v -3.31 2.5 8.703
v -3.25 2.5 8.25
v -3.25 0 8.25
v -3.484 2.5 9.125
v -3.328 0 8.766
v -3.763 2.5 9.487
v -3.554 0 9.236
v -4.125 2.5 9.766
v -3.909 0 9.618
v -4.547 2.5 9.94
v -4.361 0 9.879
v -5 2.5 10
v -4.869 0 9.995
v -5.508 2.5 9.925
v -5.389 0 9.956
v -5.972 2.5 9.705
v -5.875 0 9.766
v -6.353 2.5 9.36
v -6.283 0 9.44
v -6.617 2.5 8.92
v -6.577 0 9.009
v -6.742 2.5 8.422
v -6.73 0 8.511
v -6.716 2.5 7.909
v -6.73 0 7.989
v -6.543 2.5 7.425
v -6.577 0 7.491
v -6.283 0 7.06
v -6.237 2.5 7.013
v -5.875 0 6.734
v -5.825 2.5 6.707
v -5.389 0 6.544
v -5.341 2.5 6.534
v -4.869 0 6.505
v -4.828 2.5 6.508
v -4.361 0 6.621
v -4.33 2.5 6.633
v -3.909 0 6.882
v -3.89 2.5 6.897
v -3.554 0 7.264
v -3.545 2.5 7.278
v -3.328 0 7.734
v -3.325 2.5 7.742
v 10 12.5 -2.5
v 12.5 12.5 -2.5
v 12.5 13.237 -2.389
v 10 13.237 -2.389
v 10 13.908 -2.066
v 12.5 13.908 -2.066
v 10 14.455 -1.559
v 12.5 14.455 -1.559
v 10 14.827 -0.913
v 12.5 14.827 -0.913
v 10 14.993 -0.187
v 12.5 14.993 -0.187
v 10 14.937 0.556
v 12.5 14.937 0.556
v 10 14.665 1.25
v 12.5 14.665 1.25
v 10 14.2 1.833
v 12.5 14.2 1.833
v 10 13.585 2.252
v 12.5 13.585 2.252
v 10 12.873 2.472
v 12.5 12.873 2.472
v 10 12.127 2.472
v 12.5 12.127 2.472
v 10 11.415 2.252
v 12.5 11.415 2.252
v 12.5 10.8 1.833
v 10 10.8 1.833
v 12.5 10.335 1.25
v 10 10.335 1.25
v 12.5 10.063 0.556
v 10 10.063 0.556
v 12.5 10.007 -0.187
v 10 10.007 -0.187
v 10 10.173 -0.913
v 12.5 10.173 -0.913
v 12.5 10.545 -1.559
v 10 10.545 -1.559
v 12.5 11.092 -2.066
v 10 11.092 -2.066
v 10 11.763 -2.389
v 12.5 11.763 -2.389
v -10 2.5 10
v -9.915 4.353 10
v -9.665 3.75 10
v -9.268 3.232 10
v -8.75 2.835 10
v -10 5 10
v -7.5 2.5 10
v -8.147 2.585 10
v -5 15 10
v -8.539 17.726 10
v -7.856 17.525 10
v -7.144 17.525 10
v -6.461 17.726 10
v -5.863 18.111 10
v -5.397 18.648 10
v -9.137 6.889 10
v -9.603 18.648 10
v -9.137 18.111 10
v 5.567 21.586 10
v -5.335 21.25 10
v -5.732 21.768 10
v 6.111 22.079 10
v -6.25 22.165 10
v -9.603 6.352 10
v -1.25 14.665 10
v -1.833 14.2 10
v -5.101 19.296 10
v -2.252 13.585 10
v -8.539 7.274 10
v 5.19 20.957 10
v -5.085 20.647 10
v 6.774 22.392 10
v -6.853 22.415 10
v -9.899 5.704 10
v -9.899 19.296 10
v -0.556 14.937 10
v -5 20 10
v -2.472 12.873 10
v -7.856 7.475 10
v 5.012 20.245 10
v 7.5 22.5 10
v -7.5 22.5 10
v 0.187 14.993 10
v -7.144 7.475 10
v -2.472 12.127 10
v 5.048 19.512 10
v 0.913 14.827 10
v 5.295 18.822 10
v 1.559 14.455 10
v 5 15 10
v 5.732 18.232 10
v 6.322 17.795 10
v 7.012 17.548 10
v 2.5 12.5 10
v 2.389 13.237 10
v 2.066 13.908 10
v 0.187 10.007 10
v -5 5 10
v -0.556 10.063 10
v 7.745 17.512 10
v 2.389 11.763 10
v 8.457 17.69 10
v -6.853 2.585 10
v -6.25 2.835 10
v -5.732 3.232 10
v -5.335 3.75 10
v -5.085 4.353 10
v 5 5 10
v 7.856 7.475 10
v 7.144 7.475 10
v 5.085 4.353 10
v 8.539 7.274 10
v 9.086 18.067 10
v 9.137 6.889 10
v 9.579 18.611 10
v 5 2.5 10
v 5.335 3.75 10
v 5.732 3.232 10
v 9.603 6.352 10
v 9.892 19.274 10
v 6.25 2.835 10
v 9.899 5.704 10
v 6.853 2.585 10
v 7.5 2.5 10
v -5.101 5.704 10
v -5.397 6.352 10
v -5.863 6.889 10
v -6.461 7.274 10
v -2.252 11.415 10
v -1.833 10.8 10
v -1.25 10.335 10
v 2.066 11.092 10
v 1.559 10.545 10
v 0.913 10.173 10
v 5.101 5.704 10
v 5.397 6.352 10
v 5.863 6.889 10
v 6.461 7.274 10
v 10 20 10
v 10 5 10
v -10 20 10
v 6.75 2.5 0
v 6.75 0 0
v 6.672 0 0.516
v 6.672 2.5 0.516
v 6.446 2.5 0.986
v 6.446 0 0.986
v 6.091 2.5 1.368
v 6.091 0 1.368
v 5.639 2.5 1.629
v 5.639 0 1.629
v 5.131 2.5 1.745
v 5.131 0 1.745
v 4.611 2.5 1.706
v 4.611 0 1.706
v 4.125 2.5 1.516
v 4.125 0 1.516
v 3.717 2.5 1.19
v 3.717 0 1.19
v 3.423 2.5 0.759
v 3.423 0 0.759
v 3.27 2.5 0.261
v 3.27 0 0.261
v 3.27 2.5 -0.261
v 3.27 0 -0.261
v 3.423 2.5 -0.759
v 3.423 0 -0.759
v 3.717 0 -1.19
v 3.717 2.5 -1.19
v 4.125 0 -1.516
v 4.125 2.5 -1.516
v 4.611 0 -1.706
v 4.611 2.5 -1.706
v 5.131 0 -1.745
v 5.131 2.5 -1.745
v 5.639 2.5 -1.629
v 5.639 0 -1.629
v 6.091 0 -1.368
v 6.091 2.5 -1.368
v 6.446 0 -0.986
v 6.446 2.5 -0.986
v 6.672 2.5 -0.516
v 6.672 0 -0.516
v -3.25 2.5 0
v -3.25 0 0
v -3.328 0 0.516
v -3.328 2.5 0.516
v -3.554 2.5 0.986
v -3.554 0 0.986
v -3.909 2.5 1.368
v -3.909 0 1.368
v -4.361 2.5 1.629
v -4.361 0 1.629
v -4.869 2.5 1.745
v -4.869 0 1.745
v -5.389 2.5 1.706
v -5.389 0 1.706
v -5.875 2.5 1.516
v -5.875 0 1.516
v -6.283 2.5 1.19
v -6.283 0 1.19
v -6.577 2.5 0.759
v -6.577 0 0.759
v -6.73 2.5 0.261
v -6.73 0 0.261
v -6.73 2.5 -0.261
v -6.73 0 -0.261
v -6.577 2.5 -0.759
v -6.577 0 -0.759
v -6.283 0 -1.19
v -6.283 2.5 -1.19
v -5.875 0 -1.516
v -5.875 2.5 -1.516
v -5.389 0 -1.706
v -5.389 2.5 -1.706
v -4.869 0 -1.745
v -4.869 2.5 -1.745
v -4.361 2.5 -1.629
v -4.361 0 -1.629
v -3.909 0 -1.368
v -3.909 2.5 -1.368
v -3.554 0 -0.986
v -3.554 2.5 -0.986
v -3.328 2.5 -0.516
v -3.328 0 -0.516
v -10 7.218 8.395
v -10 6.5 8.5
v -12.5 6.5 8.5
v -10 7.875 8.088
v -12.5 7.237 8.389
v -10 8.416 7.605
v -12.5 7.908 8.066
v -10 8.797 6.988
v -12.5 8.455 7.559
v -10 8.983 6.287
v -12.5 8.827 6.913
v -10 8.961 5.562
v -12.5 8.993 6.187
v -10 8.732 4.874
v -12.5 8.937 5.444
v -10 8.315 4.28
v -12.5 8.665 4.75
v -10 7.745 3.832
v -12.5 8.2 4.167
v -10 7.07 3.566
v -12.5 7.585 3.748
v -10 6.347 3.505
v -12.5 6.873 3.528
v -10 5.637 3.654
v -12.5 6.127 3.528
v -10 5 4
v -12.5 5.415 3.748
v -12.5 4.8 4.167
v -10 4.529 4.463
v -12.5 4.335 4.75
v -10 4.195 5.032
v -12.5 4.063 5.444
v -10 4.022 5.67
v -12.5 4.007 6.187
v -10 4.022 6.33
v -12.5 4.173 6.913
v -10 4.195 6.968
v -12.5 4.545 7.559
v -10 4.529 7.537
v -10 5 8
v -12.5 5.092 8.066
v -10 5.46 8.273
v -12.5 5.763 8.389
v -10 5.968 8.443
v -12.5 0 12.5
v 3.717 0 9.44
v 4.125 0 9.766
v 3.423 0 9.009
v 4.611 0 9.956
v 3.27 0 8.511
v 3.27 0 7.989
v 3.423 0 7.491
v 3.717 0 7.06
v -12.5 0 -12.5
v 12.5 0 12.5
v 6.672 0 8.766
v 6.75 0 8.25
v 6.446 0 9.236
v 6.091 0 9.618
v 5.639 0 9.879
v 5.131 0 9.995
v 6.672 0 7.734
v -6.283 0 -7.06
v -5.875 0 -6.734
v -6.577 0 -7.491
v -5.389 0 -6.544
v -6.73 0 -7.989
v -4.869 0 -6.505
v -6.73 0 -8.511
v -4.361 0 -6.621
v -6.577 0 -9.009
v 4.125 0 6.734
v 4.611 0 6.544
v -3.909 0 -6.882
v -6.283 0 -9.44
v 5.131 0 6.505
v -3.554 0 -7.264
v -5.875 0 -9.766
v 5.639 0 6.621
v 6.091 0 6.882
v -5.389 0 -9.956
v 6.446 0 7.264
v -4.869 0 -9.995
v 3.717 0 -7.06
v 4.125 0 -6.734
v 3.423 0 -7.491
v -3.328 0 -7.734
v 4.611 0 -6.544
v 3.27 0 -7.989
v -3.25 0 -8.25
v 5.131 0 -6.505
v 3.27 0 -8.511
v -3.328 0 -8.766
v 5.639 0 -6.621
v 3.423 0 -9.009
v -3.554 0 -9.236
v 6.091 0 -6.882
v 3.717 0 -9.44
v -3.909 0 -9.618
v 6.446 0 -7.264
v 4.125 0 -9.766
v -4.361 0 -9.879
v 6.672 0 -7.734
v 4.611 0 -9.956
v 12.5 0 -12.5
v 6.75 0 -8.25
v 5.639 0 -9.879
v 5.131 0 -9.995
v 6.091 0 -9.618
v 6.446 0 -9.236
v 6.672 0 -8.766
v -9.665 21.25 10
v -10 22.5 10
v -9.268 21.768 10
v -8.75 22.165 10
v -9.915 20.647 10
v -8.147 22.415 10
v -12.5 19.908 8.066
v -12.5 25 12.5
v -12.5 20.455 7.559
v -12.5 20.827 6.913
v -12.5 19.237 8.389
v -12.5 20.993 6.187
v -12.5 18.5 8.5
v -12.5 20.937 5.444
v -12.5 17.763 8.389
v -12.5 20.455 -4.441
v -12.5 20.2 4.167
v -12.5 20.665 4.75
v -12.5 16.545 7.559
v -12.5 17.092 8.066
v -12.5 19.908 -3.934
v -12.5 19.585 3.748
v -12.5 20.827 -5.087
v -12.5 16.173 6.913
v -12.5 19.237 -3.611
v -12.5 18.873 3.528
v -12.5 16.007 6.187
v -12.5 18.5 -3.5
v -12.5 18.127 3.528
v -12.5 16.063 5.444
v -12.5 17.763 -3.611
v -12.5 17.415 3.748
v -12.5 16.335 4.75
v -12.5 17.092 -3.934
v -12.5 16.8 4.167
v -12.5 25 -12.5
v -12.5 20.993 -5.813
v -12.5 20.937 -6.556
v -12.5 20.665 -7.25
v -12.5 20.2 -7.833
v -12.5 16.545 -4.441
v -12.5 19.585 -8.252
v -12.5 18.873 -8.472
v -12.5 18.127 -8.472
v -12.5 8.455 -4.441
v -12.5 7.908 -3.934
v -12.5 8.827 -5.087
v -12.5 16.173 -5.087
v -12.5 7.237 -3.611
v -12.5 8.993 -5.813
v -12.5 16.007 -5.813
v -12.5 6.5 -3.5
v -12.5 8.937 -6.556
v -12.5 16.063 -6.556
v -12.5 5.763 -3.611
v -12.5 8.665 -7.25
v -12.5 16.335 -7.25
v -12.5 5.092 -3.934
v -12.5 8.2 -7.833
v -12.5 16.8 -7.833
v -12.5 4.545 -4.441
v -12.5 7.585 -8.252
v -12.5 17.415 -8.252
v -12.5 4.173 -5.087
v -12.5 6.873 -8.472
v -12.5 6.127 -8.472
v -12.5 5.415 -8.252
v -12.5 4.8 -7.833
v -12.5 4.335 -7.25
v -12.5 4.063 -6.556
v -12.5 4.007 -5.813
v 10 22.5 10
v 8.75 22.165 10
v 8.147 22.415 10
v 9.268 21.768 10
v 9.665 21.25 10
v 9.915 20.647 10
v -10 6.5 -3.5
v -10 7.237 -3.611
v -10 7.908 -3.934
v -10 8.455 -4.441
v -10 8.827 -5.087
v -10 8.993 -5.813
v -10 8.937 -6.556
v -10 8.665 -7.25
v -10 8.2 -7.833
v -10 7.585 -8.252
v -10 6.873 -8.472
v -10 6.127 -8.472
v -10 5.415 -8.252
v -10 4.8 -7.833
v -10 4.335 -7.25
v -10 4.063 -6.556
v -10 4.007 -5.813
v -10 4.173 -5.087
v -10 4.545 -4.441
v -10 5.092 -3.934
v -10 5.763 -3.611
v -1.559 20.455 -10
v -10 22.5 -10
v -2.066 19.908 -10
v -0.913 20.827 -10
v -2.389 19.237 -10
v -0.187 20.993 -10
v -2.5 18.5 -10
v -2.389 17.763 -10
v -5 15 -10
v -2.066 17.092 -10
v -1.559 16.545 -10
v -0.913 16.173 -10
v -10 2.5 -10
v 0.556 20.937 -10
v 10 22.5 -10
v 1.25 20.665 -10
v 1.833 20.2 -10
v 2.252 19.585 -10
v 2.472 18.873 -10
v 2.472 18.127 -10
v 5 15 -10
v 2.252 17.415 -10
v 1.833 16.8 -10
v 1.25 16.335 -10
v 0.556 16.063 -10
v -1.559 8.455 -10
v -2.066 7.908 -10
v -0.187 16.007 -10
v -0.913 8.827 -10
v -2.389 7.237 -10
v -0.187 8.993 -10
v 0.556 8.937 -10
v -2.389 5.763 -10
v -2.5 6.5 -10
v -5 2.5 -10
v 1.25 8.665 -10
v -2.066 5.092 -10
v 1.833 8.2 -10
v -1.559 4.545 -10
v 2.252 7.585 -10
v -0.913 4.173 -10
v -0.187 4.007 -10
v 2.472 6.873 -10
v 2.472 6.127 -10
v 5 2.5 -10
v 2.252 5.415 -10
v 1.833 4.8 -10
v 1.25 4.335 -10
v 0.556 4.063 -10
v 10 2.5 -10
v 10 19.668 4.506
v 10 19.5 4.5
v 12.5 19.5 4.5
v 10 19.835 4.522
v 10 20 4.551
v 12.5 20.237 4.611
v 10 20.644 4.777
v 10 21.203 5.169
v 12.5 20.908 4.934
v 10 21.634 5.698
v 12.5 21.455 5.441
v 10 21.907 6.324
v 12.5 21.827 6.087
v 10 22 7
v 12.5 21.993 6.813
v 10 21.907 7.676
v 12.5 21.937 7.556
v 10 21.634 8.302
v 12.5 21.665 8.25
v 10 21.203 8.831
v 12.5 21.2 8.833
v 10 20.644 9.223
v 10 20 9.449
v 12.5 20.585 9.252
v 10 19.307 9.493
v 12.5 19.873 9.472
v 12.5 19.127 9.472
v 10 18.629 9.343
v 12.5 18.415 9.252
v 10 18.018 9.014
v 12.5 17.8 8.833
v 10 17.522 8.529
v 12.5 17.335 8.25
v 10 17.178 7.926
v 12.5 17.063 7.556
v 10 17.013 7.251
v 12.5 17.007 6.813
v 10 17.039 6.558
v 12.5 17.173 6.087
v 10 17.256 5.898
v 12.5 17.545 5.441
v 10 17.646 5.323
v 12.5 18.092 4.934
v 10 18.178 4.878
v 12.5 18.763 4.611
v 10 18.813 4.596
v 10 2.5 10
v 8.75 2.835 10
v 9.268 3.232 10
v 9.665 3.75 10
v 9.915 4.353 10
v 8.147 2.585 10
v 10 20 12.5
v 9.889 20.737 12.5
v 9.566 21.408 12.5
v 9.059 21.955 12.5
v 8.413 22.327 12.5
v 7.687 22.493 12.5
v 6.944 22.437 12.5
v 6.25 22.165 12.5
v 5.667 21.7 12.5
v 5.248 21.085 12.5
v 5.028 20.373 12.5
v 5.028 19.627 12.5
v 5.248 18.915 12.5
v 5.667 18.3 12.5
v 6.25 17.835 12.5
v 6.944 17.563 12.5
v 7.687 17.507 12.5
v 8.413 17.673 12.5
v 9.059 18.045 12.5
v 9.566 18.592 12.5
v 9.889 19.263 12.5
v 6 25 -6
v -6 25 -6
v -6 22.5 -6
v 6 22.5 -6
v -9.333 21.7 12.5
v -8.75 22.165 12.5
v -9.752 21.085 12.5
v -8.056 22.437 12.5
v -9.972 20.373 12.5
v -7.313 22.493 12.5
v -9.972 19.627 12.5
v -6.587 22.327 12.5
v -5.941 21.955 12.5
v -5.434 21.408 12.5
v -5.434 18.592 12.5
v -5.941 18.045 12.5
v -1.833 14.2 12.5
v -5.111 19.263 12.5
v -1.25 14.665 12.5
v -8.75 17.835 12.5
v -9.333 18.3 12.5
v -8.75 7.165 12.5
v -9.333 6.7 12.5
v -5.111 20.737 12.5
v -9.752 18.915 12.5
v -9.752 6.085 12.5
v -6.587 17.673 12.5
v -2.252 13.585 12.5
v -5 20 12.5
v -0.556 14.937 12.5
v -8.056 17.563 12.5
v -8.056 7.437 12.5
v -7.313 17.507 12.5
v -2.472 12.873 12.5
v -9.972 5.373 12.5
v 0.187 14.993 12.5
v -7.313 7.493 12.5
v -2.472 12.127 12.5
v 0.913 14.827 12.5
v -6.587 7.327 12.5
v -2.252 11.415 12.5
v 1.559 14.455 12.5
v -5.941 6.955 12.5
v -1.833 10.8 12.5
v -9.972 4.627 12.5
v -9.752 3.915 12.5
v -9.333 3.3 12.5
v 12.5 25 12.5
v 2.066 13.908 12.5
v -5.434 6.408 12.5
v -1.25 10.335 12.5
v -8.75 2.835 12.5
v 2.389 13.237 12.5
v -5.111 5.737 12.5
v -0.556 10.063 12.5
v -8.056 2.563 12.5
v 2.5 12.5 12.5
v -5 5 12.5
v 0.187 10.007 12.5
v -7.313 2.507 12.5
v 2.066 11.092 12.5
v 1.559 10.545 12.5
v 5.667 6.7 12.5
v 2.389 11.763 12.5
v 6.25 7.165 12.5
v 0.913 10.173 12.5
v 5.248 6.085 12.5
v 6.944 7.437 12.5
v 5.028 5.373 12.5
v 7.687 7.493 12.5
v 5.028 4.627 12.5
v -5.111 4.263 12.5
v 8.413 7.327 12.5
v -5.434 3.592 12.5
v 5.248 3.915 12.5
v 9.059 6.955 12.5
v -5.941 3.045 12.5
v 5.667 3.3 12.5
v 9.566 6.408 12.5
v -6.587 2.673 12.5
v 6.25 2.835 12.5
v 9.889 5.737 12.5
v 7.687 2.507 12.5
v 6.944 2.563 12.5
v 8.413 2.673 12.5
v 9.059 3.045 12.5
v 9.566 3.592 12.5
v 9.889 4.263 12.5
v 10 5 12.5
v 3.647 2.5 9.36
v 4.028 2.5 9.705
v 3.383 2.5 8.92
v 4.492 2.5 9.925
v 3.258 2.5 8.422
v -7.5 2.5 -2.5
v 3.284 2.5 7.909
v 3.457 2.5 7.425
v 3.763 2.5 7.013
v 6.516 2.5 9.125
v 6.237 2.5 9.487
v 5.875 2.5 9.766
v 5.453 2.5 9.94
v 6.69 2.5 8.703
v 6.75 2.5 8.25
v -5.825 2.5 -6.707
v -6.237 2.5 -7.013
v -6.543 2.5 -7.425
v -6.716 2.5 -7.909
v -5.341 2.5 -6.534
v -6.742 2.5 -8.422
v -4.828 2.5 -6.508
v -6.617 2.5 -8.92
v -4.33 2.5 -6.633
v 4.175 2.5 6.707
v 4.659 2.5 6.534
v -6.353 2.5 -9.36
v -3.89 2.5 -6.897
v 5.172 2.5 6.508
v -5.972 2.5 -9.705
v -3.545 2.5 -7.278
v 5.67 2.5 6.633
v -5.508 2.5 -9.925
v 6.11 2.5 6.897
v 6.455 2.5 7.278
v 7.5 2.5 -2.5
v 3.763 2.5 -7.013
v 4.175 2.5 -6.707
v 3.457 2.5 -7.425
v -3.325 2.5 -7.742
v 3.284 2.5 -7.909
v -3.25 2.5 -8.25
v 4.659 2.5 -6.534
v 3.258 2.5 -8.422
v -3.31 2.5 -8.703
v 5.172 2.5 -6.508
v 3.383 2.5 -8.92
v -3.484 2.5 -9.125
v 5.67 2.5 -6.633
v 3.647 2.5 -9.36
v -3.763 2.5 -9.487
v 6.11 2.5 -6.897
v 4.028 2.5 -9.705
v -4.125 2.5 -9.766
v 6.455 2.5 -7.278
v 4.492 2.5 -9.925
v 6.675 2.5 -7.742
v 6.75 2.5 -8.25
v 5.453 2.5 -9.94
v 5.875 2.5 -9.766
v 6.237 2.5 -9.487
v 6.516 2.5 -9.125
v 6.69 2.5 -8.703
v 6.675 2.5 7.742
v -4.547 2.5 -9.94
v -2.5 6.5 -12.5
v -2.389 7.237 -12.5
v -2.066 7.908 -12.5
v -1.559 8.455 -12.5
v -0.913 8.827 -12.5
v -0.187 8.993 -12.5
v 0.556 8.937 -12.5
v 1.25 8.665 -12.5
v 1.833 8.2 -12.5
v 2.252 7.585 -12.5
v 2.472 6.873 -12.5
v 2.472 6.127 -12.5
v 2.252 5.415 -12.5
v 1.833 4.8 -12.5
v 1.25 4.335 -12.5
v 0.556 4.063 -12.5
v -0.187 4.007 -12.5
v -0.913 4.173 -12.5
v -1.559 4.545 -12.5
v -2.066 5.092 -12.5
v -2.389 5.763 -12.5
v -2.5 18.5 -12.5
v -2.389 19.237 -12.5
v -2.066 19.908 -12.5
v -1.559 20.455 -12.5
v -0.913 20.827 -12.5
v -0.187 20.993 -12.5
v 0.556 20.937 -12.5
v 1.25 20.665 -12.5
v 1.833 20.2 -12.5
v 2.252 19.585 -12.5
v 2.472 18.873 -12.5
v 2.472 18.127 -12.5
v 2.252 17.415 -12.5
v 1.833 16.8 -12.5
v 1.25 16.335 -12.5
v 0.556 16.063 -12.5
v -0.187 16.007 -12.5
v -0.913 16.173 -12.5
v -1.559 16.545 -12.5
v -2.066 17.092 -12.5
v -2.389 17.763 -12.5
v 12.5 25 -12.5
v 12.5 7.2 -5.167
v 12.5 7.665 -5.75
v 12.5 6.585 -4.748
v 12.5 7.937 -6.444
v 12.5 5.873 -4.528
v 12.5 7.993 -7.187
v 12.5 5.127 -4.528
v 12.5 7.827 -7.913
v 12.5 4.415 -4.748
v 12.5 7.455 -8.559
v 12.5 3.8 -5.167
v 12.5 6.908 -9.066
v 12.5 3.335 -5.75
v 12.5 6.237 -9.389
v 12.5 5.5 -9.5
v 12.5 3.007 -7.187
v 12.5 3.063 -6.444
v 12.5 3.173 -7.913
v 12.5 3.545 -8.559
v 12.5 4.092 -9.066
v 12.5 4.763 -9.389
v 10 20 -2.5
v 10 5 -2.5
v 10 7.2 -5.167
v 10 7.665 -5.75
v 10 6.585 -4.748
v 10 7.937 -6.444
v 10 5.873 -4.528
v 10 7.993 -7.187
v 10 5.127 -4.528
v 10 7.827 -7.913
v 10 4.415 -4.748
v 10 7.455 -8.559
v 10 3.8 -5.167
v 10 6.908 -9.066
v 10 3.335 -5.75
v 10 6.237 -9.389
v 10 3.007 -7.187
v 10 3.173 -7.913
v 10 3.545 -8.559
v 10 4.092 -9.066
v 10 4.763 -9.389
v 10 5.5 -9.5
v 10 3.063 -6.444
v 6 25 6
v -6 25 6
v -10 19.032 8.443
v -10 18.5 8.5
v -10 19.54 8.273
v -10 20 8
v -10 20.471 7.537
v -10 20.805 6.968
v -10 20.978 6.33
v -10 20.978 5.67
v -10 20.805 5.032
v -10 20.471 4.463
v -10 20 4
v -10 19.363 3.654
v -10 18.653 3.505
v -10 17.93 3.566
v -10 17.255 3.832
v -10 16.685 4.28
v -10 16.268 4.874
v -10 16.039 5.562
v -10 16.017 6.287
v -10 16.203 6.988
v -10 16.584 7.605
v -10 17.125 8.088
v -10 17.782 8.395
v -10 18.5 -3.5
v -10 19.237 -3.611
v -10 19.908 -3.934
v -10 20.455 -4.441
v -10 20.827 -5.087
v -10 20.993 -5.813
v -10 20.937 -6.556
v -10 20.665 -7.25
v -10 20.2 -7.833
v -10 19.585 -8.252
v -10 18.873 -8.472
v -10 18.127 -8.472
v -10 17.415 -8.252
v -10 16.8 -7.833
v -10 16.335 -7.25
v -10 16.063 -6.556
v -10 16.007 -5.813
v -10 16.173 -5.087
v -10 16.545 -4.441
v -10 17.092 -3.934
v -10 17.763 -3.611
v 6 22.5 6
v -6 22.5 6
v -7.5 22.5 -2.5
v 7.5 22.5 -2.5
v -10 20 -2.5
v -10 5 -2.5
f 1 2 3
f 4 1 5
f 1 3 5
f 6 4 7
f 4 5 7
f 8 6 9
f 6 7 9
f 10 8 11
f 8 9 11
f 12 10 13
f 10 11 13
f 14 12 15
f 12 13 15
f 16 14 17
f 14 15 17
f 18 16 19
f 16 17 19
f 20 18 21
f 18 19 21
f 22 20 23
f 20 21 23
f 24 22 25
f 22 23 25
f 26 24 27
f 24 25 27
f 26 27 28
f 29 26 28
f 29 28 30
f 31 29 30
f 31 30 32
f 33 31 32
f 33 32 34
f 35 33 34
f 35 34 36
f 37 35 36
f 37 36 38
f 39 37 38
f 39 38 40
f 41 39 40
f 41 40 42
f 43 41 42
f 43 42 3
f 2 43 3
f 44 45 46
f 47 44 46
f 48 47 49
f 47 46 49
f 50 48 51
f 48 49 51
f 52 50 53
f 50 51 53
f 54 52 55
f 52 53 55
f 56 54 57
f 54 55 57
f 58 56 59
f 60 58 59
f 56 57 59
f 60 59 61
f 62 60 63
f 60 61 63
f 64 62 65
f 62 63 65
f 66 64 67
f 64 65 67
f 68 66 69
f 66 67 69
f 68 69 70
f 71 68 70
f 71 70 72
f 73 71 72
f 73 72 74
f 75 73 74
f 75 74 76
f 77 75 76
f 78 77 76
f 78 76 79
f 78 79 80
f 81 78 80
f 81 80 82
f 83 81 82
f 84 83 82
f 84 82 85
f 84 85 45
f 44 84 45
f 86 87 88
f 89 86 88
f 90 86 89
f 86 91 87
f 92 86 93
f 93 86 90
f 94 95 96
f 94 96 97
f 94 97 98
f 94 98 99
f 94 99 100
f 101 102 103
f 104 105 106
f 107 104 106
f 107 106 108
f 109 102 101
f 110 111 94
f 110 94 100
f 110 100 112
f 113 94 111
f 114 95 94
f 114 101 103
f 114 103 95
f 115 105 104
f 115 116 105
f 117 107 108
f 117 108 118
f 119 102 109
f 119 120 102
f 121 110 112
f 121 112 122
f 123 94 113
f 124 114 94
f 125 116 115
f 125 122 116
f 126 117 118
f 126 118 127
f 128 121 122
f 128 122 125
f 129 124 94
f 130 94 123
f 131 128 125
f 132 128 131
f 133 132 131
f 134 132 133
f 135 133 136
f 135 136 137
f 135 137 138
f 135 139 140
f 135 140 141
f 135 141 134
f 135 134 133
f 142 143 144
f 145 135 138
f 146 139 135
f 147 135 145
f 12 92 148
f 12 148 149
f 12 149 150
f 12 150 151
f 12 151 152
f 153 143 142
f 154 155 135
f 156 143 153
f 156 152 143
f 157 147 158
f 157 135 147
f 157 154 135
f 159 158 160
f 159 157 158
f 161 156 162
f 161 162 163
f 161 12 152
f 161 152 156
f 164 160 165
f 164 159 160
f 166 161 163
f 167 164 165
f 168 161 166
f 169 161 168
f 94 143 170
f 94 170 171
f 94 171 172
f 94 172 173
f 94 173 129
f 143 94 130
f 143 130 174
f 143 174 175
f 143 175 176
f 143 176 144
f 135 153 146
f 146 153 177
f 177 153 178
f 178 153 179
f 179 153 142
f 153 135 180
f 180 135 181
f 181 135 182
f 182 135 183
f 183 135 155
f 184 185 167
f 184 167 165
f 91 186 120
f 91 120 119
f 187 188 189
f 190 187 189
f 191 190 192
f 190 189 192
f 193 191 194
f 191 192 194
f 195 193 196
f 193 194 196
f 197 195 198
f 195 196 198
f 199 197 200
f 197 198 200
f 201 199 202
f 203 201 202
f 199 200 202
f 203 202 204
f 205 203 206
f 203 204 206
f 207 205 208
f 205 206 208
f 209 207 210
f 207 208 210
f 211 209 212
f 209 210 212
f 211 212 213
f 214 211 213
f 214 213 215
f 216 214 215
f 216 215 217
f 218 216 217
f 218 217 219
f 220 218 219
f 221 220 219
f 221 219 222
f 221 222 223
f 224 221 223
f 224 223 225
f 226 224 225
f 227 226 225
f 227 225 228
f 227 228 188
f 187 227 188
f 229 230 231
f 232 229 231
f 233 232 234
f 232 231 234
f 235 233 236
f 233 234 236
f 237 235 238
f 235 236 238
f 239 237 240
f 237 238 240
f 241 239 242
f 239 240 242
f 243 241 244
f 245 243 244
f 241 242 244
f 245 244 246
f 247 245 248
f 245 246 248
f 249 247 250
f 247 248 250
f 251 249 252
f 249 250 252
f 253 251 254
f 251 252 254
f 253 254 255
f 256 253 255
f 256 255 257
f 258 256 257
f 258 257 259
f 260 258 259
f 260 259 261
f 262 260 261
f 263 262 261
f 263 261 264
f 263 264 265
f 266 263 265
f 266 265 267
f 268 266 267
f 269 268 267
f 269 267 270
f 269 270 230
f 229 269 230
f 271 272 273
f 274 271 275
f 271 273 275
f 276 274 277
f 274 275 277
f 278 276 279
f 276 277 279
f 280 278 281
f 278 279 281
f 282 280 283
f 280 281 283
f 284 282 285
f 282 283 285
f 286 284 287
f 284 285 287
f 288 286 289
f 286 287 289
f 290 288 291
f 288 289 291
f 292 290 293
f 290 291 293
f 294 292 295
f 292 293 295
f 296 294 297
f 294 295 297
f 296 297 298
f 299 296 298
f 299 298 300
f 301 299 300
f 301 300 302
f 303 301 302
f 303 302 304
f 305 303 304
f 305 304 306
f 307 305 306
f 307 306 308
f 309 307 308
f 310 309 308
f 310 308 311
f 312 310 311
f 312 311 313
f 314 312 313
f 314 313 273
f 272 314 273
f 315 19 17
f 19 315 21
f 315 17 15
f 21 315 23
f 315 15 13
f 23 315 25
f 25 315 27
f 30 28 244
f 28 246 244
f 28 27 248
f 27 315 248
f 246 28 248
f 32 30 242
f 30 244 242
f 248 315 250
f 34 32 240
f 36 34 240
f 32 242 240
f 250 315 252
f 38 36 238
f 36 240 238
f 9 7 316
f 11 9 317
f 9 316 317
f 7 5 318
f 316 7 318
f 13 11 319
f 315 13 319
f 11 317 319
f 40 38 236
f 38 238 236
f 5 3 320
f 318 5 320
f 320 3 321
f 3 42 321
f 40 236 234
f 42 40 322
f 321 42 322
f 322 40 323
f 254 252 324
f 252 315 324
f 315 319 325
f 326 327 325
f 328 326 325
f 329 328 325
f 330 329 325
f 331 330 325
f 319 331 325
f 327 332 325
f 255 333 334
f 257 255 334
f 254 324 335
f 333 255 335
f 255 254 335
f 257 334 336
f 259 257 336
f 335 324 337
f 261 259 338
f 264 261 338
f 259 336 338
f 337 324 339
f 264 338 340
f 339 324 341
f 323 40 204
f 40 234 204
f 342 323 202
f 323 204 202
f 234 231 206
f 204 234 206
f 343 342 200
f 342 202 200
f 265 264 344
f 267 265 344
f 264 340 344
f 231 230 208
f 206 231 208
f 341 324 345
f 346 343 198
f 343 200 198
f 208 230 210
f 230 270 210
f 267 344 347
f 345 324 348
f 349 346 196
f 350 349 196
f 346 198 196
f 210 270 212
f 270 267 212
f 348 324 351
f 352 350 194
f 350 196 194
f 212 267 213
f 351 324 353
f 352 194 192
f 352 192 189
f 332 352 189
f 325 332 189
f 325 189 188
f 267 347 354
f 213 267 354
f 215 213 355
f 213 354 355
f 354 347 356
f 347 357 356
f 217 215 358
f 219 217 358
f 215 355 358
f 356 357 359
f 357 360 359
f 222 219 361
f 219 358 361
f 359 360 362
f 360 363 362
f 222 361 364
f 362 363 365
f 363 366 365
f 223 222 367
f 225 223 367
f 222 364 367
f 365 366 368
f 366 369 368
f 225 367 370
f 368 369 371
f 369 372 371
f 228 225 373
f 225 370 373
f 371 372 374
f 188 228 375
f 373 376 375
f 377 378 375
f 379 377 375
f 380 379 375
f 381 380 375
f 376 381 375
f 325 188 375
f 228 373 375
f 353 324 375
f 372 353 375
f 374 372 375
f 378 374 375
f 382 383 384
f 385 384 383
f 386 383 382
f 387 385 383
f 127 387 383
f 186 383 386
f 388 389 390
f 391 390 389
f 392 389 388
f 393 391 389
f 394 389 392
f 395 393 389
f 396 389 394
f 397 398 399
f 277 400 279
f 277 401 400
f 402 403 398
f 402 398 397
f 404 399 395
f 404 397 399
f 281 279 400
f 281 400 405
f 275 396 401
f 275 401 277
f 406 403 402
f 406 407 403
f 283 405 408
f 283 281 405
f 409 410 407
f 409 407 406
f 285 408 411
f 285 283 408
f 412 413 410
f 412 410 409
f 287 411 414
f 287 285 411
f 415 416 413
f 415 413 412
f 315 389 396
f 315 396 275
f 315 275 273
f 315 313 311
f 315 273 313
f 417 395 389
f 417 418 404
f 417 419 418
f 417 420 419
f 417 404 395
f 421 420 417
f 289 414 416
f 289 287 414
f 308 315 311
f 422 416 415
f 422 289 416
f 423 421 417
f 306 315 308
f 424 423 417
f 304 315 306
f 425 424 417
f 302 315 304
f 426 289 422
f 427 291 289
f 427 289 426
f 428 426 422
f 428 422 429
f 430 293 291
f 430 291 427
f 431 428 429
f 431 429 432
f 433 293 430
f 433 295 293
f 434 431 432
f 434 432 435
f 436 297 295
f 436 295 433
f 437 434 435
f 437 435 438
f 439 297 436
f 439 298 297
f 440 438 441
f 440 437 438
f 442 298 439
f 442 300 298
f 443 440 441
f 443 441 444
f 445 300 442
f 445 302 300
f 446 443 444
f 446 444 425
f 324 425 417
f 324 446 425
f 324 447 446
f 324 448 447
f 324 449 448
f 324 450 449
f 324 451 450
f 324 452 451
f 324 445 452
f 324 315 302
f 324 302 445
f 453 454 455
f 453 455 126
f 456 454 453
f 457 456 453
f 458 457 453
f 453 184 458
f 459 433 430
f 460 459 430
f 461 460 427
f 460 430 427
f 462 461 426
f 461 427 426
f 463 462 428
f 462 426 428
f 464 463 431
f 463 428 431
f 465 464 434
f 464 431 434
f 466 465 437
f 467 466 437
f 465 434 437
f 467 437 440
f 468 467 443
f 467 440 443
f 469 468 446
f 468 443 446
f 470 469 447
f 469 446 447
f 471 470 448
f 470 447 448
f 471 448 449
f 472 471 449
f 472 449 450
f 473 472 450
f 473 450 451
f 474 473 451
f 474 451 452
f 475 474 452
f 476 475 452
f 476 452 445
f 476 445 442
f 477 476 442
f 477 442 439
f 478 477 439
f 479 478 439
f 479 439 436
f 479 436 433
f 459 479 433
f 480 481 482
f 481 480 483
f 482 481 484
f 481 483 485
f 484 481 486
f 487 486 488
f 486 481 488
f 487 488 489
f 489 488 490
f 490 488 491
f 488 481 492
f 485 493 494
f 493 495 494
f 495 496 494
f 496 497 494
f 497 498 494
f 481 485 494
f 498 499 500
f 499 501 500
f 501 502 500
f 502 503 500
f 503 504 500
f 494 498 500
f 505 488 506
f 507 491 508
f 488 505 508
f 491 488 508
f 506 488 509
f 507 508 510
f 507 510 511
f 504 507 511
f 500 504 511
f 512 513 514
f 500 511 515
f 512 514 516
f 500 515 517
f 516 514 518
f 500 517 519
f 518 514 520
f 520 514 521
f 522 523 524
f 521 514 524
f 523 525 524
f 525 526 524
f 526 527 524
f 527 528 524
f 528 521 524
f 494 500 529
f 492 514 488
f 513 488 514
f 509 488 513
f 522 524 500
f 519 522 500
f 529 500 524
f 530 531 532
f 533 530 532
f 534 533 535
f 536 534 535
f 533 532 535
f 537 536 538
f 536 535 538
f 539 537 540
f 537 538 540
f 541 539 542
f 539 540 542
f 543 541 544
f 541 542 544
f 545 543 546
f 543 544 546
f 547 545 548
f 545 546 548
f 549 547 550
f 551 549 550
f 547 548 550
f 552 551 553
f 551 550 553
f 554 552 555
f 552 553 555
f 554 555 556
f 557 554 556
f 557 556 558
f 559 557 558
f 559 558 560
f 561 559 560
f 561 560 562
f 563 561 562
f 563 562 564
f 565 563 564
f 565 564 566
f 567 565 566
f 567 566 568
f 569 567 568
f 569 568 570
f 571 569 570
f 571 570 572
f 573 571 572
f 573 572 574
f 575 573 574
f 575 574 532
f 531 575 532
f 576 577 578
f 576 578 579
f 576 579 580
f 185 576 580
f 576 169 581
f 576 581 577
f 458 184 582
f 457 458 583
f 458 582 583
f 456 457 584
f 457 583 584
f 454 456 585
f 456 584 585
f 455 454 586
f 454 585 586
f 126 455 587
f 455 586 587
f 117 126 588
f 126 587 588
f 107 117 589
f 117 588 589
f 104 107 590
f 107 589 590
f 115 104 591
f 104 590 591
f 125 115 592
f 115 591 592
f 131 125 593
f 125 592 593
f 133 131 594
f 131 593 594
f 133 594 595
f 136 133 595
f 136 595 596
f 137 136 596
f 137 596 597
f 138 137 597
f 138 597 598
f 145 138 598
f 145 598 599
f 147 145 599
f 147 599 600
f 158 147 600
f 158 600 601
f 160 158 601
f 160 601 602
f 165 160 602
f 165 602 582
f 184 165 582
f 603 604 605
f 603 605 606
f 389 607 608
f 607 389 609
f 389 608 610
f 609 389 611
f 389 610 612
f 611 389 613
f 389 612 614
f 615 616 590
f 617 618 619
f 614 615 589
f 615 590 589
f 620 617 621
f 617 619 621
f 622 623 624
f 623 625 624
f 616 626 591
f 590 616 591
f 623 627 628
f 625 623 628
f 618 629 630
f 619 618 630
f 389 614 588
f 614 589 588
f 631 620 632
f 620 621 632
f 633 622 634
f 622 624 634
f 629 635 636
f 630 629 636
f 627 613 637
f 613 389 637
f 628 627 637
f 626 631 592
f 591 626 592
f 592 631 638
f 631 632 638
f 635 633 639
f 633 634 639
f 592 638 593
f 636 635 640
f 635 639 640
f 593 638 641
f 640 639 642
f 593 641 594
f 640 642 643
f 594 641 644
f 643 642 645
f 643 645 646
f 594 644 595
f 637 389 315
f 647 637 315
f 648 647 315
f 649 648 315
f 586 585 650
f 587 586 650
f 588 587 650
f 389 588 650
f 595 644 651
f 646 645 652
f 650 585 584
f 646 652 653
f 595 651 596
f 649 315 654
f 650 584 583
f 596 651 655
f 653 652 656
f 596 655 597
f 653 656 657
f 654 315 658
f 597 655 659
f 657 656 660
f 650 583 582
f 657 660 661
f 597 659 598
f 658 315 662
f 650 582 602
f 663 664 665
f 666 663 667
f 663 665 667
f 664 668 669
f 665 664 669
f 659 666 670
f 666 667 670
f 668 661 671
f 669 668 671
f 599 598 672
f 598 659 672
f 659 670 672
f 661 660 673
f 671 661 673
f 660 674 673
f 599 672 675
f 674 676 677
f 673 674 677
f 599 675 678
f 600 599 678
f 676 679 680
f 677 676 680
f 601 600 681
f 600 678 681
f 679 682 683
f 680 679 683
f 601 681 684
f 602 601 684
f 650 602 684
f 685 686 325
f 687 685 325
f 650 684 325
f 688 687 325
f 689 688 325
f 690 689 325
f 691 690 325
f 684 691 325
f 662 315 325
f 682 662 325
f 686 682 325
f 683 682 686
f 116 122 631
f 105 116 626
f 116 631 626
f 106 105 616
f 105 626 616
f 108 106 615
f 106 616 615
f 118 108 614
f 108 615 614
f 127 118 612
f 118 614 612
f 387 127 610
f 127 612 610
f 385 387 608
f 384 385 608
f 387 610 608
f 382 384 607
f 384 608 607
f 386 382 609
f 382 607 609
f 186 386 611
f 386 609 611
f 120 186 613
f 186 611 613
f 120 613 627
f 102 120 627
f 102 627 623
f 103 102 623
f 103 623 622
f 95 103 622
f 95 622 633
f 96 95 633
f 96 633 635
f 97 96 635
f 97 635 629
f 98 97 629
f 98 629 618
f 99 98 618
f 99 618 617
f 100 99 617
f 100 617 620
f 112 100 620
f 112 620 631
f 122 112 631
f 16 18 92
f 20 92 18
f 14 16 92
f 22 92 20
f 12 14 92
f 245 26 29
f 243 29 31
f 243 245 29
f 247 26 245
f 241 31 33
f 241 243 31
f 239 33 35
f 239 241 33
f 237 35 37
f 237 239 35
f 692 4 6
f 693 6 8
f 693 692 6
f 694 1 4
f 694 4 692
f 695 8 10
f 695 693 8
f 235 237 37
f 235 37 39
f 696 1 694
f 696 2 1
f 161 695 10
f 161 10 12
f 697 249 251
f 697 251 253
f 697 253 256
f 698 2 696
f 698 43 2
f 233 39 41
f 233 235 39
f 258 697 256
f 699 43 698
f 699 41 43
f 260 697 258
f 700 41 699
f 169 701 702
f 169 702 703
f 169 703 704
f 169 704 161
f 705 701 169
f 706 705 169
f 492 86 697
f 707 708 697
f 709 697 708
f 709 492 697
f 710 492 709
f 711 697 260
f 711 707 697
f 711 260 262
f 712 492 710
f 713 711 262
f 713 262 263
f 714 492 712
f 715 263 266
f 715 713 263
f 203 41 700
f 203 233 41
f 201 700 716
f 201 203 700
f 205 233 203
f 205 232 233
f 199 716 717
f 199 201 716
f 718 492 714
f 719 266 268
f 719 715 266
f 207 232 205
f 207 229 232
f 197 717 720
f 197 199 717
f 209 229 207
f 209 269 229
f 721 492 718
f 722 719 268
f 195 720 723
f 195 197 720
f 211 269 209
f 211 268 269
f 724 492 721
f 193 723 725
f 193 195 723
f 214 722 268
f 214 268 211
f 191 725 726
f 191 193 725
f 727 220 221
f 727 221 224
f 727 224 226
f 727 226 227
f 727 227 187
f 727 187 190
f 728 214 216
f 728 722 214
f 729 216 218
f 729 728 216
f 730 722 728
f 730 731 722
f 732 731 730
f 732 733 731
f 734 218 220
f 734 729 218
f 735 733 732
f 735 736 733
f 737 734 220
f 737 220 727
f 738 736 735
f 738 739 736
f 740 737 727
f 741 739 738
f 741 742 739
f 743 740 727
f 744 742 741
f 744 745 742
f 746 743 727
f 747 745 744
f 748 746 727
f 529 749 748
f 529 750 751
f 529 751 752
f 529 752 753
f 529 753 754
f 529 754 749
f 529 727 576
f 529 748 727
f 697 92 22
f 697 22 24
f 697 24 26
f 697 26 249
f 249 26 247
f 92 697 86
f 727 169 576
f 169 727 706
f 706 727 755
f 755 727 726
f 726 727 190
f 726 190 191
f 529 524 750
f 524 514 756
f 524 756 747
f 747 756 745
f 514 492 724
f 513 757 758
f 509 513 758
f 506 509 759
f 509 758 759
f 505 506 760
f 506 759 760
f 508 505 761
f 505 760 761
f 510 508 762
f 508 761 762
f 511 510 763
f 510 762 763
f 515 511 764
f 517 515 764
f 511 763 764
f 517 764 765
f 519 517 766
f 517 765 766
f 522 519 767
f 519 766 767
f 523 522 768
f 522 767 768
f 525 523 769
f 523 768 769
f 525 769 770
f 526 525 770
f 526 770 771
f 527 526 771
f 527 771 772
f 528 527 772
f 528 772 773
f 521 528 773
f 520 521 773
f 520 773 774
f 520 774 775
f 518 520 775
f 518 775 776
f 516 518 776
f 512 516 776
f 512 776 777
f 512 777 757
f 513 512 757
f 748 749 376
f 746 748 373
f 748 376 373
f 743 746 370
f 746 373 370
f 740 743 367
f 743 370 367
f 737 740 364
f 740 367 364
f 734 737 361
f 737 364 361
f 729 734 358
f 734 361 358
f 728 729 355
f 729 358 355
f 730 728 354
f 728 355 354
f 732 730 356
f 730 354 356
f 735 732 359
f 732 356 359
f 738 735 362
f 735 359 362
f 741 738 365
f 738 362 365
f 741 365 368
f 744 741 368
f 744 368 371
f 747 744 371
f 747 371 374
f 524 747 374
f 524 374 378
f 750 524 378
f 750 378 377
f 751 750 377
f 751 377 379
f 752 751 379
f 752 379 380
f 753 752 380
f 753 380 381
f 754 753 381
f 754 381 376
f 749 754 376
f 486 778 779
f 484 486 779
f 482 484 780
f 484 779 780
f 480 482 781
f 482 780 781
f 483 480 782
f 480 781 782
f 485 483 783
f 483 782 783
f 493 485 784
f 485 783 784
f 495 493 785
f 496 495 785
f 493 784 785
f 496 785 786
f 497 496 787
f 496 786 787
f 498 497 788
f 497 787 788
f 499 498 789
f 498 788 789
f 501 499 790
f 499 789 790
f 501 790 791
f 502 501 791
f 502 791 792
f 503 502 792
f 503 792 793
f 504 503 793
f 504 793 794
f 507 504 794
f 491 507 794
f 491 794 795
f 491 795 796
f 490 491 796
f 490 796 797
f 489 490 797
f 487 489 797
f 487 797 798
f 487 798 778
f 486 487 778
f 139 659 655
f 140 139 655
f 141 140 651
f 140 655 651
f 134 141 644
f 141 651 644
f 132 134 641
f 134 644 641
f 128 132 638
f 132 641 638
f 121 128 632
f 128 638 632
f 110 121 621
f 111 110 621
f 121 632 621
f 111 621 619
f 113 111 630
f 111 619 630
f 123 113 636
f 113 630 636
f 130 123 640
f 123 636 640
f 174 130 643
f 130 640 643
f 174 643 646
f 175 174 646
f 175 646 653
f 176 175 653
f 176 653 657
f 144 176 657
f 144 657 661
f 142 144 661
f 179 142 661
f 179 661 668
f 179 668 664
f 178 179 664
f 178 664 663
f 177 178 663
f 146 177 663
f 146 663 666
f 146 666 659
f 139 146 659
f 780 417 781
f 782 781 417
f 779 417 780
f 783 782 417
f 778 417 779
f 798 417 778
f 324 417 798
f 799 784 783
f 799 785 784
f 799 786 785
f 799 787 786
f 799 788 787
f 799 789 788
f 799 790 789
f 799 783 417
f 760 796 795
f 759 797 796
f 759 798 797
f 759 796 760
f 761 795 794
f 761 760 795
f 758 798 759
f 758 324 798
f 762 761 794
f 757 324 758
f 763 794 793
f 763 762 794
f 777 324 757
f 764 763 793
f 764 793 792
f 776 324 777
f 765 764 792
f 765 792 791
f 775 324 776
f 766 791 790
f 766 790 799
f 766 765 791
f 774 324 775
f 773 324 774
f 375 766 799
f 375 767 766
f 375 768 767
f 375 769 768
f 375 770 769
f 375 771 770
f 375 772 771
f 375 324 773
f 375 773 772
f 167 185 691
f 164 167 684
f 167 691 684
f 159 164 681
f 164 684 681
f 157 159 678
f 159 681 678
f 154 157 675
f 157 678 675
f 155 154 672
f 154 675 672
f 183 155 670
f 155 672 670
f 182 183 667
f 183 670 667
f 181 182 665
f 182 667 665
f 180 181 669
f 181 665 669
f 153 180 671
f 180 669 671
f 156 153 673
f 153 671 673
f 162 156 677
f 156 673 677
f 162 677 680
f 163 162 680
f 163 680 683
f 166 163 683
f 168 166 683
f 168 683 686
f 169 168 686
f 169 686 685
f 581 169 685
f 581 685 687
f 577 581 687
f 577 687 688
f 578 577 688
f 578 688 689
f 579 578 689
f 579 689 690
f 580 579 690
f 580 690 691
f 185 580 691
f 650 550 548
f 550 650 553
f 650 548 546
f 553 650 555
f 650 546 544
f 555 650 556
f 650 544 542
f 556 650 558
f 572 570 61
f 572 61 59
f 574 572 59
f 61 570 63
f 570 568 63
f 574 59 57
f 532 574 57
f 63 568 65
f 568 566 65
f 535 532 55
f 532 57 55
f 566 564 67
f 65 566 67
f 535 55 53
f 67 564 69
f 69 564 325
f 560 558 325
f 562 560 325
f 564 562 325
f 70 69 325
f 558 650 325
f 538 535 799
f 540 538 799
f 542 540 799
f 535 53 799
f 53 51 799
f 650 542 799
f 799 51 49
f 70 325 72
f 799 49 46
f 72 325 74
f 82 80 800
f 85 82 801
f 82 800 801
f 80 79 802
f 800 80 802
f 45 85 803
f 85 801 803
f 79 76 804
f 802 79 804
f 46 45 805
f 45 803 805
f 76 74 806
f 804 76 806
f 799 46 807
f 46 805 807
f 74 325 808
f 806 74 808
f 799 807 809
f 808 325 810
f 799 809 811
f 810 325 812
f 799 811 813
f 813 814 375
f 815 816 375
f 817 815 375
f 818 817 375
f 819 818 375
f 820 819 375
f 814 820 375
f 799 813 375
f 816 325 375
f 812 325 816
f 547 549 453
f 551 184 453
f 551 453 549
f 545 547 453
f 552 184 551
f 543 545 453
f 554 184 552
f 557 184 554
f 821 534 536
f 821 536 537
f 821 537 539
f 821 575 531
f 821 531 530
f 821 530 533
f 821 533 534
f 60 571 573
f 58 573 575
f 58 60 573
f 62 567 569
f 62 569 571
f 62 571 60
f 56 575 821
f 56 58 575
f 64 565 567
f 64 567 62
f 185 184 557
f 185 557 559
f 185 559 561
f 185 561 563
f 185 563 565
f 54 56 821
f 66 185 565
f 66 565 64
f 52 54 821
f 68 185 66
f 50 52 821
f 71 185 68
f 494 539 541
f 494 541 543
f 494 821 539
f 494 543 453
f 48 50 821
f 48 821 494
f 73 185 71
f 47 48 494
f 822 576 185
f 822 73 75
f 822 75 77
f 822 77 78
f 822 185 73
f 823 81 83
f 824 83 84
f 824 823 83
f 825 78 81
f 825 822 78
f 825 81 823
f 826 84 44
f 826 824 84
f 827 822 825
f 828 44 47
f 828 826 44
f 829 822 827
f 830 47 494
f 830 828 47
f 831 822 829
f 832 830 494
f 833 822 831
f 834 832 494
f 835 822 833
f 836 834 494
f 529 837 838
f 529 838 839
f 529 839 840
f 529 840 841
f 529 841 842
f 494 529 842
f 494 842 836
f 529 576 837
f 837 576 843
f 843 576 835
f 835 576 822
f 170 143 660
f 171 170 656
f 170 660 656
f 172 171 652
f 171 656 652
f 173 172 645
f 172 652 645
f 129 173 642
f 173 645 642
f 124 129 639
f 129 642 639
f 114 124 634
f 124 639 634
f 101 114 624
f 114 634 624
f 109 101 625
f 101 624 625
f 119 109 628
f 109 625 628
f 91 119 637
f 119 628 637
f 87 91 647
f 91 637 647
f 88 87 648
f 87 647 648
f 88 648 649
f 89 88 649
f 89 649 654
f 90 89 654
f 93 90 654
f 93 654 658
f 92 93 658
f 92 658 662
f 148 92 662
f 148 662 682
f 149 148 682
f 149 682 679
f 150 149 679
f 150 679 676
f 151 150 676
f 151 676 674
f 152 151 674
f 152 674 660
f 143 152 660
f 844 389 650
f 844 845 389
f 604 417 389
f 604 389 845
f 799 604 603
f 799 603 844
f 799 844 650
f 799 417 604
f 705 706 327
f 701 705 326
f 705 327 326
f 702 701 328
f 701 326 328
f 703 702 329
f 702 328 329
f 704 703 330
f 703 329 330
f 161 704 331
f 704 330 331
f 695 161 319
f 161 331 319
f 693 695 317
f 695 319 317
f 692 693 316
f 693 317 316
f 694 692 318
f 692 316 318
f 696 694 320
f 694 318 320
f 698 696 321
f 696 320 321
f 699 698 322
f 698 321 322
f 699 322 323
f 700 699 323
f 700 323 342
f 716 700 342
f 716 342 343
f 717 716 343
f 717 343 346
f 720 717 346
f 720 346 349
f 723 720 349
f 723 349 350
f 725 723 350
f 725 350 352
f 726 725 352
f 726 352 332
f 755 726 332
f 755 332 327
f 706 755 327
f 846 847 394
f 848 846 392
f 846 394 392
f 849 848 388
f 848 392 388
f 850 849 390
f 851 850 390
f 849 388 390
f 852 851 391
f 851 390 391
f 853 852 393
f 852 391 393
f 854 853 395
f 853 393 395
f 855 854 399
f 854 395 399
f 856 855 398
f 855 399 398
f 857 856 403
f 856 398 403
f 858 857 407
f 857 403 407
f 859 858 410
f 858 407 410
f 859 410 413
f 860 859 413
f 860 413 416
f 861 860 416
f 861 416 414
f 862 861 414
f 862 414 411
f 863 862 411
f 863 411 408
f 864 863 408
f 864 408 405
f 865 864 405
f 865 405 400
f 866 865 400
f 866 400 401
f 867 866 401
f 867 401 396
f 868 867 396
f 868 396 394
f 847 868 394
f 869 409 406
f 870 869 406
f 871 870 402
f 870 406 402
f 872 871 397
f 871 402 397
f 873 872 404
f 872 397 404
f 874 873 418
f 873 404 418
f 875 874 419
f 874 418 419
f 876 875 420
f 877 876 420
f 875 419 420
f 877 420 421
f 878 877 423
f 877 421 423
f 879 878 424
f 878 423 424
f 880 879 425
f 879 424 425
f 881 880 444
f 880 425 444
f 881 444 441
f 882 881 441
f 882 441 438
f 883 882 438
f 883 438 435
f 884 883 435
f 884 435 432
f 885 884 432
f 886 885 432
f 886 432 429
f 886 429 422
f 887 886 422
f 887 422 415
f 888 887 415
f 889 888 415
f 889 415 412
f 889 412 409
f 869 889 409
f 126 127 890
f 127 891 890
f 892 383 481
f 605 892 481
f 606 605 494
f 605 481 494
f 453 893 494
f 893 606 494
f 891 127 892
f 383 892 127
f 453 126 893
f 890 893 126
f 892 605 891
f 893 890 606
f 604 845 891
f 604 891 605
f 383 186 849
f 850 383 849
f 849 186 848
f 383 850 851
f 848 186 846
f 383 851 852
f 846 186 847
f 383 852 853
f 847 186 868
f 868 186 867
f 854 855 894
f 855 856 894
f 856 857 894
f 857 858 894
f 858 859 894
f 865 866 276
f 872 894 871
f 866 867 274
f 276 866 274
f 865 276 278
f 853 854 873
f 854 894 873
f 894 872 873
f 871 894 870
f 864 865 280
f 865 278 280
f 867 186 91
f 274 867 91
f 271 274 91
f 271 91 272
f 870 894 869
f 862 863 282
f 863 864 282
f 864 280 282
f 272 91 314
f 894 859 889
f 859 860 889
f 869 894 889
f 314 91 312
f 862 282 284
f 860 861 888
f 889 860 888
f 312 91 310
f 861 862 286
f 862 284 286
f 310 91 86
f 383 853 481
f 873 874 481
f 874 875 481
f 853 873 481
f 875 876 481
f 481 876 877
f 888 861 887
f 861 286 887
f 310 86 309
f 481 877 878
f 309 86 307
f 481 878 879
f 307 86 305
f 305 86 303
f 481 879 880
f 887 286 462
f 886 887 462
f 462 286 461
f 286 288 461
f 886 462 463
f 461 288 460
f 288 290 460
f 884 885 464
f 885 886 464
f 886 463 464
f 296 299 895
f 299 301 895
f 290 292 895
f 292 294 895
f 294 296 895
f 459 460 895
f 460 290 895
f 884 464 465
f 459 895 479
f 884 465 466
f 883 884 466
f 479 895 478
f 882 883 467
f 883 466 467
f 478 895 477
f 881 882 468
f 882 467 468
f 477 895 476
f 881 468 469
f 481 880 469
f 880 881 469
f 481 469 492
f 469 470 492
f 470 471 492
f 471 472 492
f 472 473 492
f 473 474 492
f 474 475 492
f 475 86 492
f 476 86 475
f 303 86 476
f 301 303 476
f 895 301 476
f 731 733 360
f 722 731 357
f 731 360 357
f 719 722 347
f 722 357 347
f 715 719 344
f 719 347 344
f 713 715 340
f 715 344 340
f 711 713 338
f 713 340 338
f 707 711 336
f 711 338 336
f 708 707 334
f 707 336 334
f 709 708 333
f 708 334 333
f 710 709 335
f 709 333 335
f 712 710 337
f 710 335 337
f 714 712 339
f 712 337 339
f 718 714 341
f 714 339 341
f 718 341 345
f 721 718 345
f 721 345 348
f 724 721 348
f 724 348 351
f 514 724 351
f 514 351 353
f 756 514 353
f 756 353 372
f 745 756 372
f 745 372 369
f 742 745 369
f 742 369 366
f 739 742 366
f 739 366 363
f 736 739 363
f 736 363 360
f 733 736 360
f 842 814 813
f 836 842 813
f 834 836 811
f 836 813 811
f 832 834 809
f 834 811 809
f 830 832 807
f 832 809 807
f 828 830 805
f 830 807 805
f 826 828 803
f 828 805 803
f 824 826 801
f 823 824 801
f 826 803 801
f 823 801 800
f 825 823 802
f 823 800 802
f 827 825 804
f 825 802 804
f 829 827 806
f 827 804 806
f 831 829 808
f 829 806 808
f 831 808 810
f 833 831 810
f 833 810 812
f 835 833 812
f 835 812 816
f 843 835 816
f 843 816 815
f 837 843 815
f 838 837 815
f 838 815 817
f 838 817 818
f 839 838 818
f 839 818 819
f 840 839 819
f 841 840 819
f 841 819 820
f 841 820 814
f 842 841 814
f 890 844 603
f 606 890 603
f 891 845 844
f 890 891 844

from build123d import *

# Parameters (mm, degrees)
SKETCH1_W           = 25
SKETCH1_H           = 25
BOSS_EXTRUDE1_DEPTH = 25
SHELL1_T            = 2.5
SKETCH2_W           = 12
SKETCH2_H           = 12
CUT_EXTRUDE1_DEPTH  = 15
SKETCH3_R           = 1.75
CUT_EXTRUDE2_DEPTH  = 15
SKETCH4_R           = 2.5
CUT_EXTRUDE6_DEPTH  = 15
SKETCH4_3_R         = 2.5
CUT_EXTRUDE7_DEPTH  = 15
SKETCH5_R           = 2.5
CUT_EXTRUDE8_DEPTH  = 15
SKETCH5_4_R         = 2.5
CUT_EXTRUDE9_DEPTH  = 15
SKETCH5_5_R         = 2.5
CUT_EXTRUDE10_DEPTH = 15
SKETCH7_R           = 2.5
CUT_EXTRUDE11_DEPTH = 15
SKETCH8_R           = 2.5
CUT_EXTRUDE12_DEPTH = 10


with BuildPart() as part:
    # Sketch1 → Boss-Extrude1 (new body)
    with BuildSketch(Plane(origin=(0, 0, 0), x_dir=(1, 0, 0), z_dir=(0, 1, 0))):
        Rectangle(SKETCH1_W, SKETCH1_H)
    extrude(amount=BOSS_EXTRUDE1_DEPTH)

    # Shell1 (no face opened: a closed hollow body)
    add(offset(amount=-SHELL1_T, mode=Mode.PRIVATE), mode=Mode.SUBTRACT)

    # Sketch2 → Cut-Extrude1 (cut)
    with BuildSketch(Plane(origin=(0, 25, 0), x_dir=(1, 0, 0), z_dir=(0, 1, 0))):
        Rectangle(SKETCH2_W, SKETCH2_H)
    extrude(amount=-CUT_EXTRUDE1_DEPTH, mode=Mode.SUBTRACT)

    # Sketch3 → Cut-Extrude2 (cut)
    with BuildSketch(Plane.XZ):
        with Locations((-5, 8.25)):
            Circle(SKETCH3_R)
        with Locations((-5, 0)):
            Circle(SKETCH3_R)
        with Locations((-5, -8.25)):
            Circle(SKETCH3_R)
        with Locations((5, 8.25)):
            Circle(SKETCH3_R)
        with Locations((5, 0)):
            Circle(SKETCH3_R)
        with Locations((5, -8.25)):
            Circle(SKETCH3_R)
    extrude(amount=-CUT_EXTRUDE2_DEPTH, mode=Mode.SUBTRACT)

    # Sketch4 → Cut-Extrude6 (cut)
    with BuildSketch(Plane(origin=(12.5, 0, 0), x_dir=(0, 0, -1), z_dir=(1, 0, 0))):
        with Locations((-7, 19.5)):
            Circle(SKETCH4_R)
    extrude(amount=-CUT_EXTRUDE6_DEPTH, mode=Mode.SUBTRACT)

    # Sketch4<3> → Cut-Extrude7 (cut)
    with BuildSketch(Plane(origin=(12.5, 0, 0), x_dir=(0, 0, -1), z_dir=(1, 0, 0))):
        with Locations((0, 12.5)):
            Circle(SKETCH4_3_R)
        with Locations((7, 5.5)):
            Circle(SKETCH4_3_R)
    extrude(amount=-CUT_EXTRUDE7_DEPTH, mode=Mode.SUBTRACT)

    # Sketch5 → Cut-Extrude8 (cut)
    with BuildSketch(Plane.ZY.offset(12.5)):
        with Locations((-6, 18.5)):
            Circle(SKETCH5_R)
    extrude(amount=-CUT_EXTRUDE8_DEPTH, mode=Mode.SUBTRACT)

    # Sketch5<4> → Cut-Extrude9 (cut)
    with BuildSketch(Plane.ZY.offset(12.5)):
        with Locations((6, 18.5)):
            Circle(SKETCH5_4_R)
    extrude(amount=-CUT_EXTRUDE9_DEPTH, mode=Mode.SUBTRACT)

    # Sketch5<5> → Cut-Extrude10 (cut)
    with BuildSketch(Plane.ZY.offset(12.5)):
        with Locations((6, 6.5)):
            Circle(SKETCH5_5_R)
        with Locations((-6, 6.5)):
            Circle(SKETCH5_5_R)
    extrude(amount=-CUT_EXTRUDE10_DEPTH, mode=Mode.SUBTRACT)

    # Sketch7 → Cut-Extrude11 (cut)
    with BuildSketch(Plane.XY.offset(12.5)):
        with Locations((-7.5, 20)):
            Circle(SKETCH7_R)
        with Locations((0, 12.5)):
            Circle(SKETCH7_R)
        with Locations((7.5, 20)):
            Circle(SKETCH7_R)
        with Locations((7.5, 5)):
            Circle(SKETCH7_R)
        with Locations((-7.5, 5)):
            Circle(SKETCH7_R)
    extrude(amount=-CUT_EXTRUDE11_DEPTH, mode=Mode.SUBTRACT)

    # Sketch8 → Cut-Extrude12 (cut)
    with BuildSketch(Plane(origin=(0, 0, -12.5), x_dir=(-1, 0, 0), z_dir=(0, 0, -1))):
        with Locations((0, 18.5)):
            Circle(SKETCH8_R)
        with Locations((0, 6.5)):
            Circle(SKETCH8_R)
    extrude(amount=-CUT_EXTRUDE12_DEPTH, mode=Mode.SUBTRACT)


solid = part.part
